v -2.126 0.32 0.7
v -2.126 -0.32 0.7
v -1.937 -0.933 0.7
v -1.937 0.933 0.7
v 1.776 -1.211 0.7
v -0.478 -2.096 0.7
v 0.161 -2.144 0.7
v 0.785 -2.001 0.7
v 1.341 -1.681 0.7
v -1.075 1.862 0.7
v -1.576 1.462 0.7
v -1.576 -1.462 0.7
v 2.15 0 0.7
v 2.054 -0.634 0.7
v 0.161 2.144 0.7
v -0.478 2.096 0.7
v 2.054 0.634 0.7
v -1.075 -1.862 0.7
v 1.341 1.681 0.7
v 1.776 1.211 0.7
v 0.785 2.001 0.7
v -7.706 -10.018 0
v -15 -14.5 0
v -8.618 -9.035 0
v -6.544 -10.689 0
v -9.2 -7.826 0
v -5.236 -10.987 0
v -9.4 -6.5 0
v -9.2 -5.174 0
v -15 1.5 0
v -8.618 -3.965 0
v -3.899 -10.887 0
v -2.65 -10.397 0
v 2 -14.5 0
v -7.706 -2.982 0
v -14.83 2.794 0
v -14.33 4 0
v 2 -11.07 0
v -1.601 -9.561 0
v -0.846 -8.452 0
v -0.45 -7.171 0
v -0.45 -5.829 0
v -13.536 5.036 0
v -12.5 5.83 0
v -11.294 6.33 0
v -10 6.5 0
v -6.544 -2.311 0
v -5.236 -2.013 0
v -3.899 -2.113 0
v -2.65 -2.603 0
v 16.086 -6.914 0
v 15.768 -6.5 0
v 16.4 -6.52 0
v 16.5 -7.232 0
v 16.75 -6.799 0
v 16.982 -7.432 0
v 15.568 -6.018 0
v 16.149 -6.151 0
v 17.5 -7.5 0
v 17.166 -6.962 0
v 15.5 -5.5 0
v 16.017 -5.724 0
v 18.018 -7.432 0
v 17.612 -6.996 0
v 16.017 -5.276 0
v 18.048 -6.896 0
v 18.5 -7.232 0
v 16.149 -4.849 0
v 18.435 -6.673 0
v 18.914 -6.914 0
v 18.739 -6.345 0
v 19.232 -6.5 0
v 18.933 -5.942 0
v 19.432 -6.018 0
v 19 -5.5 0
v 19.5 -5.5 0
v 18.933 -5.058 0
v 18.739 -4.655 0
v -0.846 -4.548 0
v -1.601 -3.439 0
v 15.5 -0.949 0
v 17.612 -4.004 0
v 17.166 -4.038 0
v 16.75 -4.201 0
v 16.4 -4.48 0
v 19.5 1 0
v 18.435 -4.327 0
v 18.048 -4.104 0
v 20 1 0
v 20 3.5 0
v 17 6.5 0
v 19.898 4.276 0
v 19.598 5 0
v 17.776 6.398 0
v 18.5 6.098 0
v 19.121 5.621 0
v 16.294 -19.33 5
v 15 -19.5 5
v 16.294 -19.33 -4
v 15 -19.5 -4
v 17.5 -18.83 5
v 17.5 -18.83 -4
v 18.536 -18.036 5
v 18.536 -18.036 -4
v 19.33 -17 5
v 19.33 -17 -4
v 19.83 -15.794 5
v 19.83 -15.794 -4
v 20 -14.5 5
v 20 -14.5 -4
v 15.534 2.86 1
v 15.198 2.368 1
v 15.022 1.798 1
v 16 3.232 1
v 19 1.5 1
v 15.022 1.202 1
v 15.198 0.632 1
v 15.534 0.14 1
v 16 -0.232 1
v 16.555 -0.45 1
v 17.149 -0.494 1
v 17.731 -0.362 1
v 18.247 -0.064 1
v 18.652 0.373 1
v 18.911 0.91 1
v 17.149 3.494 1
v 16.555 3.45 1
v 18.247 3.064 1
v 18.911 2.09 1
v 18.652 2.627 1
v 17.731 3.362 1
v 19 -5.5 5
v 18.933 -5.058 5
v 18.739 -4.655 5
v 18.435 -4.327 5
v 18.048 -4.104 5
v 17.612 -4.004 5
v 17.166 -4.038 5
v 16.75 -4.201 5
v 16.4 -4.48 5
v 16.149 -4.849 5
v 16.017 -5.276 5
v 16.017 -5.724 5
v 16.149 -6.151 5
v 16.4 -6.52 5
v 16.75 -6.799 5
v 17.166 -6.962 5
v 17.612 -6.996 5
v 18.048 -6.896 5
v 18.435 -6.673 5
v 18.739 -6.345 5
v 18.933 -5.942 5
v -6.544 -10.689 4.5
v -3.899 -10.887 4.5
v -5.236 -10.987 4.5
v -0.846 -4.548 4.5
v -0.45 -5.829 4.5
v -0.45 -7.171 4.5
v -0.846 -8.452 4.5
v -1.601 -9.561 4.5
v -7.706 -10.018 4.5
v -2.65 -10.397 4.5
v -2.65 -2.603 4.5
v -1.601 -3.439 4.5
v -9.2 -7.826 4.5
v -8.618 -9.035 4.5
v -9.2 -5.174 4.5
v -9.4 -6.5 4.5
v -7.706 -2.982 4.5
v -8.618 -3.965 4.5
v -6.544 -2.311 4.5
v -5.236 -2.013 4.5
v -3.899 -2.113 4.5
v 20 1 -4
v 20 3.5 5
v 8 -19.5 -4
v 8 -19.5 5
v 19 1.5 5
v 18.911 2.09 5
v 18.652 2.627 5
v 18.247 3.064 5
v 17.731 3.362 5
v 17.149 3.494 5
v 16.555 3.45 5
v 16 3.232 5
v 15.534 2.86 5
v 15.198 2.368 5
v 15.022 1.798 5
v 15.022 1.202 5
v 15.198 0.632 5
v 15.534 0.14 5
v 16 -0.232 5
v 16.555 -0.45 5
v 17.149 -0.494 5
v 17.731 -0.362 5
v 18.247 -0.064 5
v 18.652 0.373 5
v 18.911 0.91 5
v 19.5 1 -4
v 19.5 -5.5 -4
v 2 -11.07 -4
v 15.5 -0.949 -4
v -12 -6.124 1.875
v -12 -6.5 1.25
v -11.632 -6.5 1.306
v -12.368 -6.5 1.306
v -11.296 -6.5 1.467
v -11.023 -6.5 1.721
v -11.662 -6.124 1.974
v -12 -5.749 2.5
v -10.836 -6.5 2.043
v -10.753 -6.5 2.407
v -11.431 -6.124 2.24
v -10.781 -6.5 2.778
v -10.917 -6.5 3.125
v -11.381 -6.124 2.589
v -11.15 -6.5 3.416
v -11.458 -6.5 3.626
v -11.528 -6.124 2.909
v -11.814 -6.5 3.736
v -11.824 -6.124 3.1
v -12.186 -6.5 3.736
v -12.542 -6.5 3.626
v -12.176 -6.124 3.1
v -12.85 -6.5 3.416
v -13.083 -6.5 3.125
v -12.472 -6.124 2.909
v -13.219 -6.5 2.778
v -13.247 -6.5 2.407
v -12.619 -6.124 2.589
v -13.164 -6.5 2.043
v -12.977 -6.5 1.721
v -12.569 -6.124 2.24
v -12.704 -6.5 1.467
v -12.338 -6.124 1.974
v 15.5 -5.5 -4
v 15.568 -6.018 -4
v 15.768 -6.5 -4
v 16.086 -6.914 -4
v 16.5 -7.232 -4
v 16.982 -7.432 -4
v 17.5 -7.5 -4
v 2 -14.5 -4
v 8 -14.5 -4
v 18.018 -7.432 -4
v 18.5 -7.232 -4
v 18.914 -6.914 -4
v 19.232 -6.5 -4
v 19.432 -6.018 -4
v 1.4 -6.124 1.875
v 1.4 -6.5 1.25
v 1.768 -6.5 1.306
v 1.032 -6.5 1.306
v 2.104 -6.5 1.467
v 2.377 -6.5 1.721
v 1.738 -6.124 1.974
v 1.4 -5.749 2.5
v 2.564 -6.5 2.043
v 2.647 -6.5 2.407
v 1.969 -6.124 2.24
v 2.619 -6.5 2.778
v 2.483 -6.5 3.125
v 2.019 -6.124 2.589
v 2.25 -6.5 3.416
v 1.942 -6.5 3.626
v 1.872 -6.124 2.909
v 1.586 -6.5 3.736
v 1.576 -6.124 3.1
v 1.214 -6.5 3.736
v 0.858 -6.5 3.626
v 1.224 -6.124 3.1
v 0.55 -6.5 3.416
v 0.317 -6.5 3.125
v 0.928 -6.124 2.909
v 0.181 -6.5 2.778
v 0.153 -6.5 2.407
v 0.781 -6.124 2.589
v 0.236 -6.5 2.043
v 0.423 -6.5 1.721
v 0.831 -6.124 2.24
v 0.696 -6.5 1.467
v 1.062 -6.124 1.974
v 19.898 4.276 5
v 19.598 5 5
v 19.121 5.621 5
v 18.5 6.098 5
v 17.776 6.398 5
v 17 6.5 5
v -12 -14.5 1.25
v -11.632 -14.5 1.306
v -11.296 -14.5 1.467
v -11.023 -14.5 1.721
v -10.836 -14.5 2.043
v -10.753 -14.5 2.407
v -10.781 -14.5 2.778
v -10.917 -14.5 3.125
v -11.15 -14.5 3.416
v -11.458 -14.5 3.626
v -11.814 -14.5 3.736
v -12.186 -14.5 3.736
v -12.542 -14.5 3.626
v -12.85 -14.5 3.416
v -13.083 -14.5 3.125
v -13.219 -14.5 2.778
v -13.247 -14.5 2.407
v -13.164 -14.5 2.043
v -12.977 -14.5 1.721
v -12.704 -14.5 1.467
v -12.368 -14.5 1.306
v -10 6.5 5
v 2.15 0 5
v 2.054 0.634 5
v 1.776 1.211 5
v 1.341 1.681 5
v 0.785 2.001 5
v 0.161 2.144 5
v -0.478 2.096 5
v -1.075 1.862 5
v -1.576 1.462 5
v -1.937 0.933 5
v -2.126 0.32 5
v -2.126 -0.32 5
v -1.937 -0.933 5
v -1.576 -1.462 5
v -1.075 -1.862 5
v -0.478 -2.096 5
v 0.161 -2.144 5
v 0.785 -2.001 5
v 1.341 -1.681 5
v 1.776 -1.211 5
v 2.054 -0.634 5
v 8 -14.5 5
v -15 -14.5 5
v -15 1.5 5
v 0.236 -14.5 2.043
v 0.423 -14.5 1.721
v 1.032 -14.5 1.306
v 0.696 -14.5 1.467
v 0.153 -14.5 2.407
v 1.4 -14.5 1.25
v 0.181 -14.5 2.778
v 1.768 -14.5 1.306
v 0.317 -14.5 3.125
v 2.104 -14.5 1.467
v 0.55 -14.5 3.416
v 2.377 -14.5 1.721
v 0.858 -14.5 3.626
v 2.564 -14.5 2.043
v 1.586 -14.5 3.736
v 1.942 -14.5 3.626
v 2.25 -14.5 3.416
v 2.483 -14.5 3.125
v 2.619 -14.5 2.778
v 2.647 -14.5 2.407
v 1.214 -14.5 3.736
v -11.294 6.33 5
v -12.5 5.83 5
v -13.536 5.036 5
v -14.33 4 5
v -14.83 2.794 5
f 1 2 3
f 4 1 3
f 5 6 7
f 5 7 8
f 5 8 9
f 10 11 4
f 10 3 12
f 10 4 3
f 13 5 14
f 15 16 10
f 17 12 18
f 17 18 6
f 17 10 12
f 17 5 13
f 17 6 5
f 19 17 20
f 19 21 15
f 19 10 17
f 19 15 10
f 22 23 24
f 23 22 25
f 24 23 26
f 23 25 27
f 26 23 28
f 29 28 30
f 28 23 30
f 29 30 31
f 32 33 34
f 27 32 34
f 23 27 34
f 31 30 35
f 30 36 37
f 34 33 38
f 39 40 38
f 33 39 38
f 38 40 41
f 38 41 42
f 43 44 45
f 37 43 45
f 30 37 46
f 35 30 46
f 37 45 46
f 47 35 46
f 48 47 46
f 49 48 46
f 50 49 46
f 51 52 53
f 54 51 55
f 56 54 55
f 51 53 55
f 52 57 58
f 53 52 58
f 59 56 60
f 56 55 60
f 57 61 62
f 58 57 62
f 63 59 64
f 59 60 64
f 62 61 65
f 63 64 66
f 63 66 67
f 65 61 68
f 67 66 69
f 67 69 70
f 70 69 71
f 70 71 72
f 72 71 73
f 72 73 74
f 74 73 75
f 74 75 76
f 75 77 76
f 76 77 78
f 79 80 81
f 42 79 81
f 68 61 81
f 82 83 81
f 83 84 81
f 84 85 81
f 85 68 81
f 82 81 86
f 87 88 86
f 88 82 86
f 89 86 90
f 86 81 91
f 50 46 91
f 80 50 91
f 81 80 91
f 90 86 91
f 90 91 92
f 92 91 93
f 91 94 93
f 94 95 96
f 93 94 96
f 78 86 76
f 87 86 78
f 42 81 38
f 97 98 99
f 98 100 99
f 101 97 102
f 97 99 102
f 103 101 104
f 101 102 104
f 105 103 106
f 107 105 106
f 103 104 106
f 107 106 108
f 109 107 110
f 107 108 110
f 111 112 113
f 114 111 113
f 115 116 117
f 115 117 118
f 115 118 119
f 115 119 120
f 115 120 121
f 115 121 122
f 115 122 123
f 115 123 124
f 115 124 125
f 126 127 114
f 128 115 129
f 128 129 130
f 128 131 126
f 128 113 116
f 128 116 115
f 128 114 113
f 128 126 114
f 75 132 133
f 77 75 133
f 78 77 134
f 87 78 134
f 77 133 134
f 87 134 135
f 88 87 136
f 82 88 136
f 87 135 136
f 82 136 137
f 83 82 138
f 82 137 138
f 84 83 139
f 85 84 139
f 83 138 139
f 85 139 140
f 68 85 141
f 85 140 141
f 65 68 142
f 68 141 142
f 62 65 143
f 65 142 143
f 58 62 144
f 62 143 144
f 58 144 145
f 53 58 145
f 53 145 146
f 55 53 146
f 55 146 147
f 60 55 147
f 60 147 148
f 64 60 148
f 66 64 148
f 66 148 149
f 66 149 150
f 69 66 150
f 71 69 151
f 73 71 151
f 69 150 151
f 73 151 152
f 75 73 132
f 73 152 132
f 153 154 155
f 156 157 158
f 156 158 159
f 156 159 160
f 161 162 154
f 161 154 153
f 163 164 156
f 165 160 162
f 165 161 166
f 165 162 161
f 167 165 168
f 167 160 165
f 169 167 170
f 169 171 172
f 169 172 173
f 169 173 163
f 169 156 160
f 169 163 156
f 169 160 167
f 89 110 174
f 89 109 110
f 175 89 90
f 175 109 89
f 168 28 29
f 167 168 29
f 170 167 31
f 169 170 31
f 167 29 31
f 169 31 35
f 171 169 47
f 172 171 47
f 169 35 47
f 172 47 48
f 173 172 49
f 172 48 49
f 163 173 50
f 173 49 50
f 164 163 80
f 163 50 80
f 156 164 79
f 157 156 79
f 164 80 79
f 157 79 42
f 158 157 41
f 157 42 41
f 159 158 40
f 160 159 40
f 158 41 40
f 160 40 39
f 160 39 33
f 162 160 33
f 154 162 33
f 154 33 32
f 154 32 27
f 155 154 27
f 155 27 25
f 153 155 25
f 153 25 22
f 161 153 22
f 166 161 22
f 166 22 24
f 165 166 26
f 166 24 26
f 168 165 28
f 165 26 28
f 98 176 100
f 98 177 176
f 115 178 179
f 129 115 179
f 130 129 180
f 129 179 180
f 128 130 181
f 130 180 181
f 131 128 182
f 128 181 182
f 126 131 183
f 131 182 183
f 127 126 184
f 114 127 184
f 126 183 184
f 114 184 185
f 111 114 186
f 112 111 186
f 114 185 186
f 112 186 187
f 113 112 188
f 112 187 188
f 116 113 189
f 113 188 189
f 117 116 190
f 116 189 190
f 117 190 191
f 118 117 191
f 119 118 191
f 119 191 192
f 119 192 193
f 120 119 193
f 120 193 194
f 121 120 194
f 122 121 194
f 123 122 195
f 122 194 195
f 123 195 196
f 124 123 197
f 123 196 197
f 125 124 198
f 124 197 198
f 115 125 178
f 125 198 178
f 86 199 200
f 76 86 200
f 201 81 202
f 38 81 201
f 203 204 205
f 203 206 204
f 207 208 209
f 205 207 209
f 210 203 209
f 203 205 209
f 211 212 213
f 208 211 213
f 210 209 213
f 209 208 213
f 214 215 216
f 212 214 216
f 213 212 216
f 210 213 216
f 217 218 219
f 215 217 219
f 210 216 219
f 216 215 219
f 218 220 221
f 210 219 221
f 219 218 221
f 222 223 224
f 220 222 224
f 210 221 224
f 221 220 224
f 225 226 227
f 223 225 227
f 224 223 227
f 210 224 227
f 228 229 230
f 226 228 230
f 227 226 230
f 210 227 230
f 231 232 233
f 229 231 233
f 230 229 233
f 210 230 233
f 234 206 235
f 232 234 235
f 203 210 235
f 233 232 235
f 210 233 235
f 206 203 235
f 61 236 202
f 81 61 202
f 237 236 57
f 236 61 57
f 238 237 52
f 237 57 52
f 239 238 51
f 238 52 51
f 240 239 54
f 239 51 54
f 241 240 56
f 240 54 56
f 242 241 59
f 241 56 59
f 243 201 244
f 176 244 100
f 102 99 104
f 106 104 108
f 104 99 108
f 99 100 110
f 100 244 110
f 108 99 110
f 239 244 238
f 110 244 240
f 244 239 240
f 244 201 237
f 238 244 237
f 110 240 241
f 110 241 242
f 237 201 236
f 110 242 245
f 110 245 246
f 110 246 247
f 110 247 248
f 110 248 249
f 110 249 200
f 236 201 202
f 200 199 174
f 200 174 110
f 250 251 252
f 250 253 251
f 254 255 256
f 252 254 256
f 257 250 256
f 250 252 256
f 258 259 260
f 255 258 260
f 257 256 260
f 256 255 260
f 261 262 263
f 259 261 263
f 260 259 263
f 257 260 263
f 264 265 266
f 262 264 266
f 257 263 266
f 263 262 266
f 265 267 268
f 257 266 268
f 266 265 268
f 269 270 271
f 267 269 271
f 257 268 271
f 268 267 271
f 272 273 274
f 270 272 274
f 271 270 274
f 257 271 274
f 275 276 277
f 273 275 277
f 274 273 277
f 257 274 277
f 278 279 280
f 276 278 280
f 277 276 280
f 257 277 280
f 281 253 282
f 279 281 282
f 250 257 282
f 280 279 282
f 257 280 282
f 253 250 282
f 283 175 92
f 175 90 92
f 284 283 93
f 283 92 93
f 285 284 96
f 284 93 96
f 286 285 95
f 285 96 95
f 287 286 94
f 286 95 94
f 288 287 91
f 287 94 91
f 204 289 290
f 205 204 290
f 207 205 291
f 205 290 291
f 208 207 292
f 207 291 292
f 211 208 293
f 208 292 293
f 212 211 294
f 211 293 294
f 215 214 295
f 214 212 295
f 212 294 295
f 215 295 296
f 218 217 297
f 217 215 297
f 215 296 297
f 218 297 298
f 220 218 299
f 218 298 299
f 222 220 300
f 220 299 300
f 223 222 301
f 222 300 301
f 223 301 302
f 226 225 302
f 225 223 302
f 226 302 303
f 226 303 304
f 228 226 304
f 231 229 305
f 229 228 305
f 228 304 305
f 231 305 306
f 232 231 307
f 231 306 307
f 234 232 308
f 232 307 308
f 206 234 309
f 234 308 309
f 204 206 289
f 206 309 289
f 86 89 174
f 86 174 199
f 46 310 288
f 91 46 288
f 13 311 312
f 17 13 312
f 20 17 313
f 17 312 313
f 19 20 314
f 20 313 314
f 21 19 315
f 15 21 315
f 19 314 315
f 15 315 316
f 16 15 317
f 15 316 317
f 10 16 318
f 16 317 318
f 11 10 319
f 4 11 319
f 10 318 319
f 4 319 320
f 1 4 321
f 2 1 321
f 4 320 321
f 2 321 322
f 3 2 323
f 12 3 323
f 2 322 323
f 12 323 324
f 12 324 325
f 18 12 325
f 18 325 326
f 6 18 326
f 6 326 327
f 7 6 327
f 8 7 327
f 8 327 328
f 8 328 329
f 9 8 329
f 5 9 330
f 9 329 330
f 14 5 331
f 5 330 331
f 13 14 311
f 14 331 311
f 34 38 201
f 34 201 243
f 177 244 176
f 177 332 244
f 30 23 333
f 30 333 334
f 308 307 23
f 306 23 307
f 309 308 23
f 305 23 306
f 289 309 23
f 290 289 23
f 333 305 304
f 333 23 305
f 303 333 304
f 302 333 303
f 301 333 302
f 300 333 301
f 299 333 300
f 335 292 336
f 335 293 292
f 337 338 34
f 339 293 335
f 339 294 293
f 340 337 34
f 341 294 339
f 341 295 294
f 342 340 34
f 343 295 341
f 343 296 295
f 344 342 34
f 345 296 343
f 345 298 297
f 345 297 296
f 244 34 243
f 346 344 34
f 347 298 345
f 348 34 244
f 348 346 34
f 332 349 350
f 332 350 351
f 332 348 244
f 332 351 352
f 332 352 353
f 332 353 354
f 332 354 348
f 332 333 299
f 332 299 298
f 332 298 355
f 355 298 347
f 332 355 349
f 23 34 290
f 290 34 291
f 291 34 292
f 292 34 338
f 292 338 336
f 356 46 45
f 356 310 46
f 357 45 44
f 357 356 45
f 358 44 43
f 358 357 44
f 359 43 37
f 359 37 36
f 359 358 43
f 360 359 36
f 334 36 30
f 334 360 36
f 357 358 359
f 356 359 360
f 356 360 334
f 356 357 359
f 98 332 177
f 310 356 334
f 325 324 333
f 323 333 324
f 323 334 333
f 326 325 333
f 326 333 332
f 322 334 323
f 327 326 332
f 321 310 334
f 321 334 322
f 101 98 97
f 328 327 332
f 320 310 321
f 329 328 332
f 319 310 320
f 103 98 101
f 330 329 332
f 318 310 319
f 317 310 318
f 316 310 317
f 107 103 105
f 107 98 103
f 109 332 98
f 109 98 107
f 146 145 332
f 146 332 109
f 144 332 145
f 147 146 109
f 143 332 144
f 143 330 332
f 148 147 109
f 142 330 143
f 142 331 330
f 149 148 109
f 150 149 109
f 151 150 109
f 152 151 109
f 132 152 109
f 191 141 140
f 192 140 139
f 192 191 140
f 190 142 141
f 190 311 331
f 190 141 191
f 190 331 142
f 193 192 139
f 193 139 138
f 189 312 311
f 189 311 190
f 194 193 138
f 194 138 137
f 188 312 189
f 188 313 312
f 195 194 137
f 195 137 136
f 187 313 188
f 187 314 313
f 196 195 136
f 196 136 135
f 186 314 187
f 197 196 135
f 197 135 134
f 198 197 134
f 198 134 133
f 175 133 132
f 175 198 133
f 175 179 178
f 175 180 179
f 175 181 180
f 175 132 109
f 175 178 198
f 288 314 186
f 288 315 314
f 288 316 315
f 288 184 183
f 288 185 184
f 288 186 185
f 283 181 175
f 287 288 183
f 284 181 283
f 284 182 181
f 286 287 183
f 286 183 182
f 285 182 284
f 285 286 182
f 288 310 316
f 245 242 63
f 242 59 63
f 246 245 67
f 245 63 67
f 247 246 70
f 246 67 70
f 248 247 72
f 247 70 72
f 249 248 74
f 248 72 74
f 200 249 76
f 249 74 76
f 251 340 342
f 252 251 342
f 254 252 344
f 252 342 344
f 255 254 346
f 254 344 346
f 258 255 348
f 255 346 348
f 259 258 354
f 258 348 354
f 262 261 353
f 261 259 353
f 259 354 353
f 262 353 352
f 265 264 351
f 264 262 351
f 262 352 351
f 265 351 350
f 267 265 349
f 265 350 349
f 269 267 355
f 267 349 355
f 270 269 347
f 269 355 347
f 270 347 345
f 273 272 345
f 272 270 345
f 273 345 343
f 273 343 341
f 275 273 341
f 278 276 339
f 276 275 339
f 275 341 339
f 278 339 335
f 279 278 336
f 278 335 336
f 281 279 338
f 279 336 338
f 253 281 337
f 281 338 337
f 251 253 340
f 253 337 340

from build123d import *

# Parameters (mm, degrees)
SKETCH1_W             = 23
SKETCH1_H             = 21
EXTRUDE1_DEPTH        = 5
SKETCH2_R             = 2.15
EXTRUDE2_DEPTH        = 4.3
SKETCH3_R             = 4.5
EXTRUDE3_DEPTH        = 4.5
SKETCH4_R             = 1.25
EXTRUDE4_DEPTH        = 8
SKETCH7_W             = 12
SKETCH7_H             = 26
EXTRUDE6_DEPTH        = 5
SKETCH8_R             = 2
EXTRUDE7_DEPTH        = 4
SKETCH9_R             = 1.5
EXTRUDE8_DEPTH        = 5
FILLET2_R             = 3
M3_TAPPED_HOLE1_D     = 2.5
M3_TAPPED_HOLE1_DEPTH = 8
M3_TAPPED_HOLE1_TIP   = 0.751075774
EXTRUDE9_DEPTH        = 4
FILLET1_R             = 5
EXTRUDE10_DEPTH       = 4
FILLET3_R             = 2


with BuildPart() as part:
    # Sketch1 → Extrude1 (new body)
    with BuildSketch(Plane.XY):
        with Locations((-3.5, -4)):
            Rectangle(SKETCH1_W, SKETCH1_H)
    extrude(amount=EXTRUDE1_DEPTH)

    # Sketch2 → Extrude2 (cut)
    with BuildSketch(Plane.XY.offset(5)):
        Circle(SKETCH2_R)
    extrude(amount=-EXTRUDE2_DEPTH, mode=Mode.SUBTRACT)

    # Sketch3 → Extrude3 (cut)
    with BuildSketch(Plane(origin=(0, 0, 0), x_dir=(-1, 0, 0), z_dir=(0, 0, -1))):
        with Locations((4.9, -6.5)):
            Circle(SKETCH3_R)
    extrude(amount=-EXTRUDE3_DEPTH, mode=Mode.SUBTRACT)

    # Sketch4 → Extrude4 (cut)
    with BuildSketch(Plane.XZ.offset(14.5)):
        with Locations(Location((-12, 2.5, 0), (0, 0, 270))):
            Circle(SKETCH4_R)
        with Locations(Location((1.4, 2.5, 0), (0, 0, 270))):
            Circle(SKETCH4_R)
    extrude(amount=-EXTRUDE4_DEPTH, mode=Mode.SUBTRACT)

    # Sketch7 → Extrude6 (add)
    with BuildSketch(Plane.XY.offset(5)):
        with Locations((14, -6.5)):
            Rectangle(SKETCH7_W, SKETCH7_H)
    extrude(amount=-EXTRUDE6_DEPTH)

    # Sketch8 → Extrude7 (cut)
    with BuildSketch(Plane.XY.offset(5)):
        with Locations((17, 1.5)):
            Circle(SKETCH8_R)
    extrude(amount=-EXTRUDE7_DEPTH, mode=Mode.SUBTRACT)

    # Sketch9 → Extrude8 (cut)
    with BuildSketch(Plane.XY.offset(5)):
        with Locations((17.5, -5.5)):
            Circle(SKETCH9_R)
    extrude(amount=-EXTRUDE8_DEPTH, mode=Mode.SUBTRACT)

    # Fillet2
    fillet2_edges = [part.edges().sort_by_distance(p)[0] for p in [
        (20, 6.5, 2.5),
        (20, -19.5, 2.5),
    ]]
    fillet(fillet2_edges, radius=FILLET2_R)

    # M3 Tapped Hole1
    with Locations(Plane(origin=(-12, -14.5, 2.5), x_dir=(0, 0, -1), z_dir=(0, -1, 0))):
        with Locations((0, 0), (0, 13.4)):
            Hole(M3_TAPPED_HOLE1_D / 2, depth=M3_TAPPED_HOLE1_DEPTH)
            with Locations((0, 0, -(M3_TAPPED_HOLE1_DEPTH + M3_TAPPED_HOLE1_TIP / 2))):  # 118° drill point
                Cone(0, M3_TAPPED_HOLE1_D / 2, M3_TAPPED_HOLE1_TIP, mode=Mode.SUBTRACT)

    # Sketch11 → Extrude9 (add)
    with BuildSketch(Plane(origin=(0, 0, 0), x_dir=(-1, 0, 0), z_dir=(0, 0, -1))):
        Polygon((-8, -19.5), (-20, -19.5), (-20, 1), (-18.1, 1), (-2, -11.07), (-2, -14.5), (-8, -14.5), align=None)
    extrude(amount=EXTRUDE9_DEPTH)

    # Fillet1
    fillet1_edges = [part.edges().sort_by_distance(p)[0] for p in [
        (-15, 6.5, 2.5),
        (20, -19.5, -2),
    ]]
    fillet(fillet1_edges, radius=FILLET1_R)

    # Sketch12 → Extrude10 (cut)
    with BuildSketch(Plane(origin=(0, 0, -4), x_dir=(-1, 0, 0), z_dir=(0, 0, -1))):
        Polygon((-19.5, 1), (-19.5, -7.5), (-15.5, -7.5), (-15.5, -0.949192547), (-18.1, 1), align=None)
    extrude(amount=-EXTRUDE10_DEPTH, mode=Mode.SUBTRACT)

    # Fillet3
    fillet3_edges = [part.edges().sort_by_distance(p)[0] for p in [
        (15.5, -7.5, -2),
        (19.5, -7.5, -2),
    ]]
    fillet(fillet3_edges, radius=FILLET3_R - 0.0001)  # a hair under: the kernel refuses the full size


solid = part.part
